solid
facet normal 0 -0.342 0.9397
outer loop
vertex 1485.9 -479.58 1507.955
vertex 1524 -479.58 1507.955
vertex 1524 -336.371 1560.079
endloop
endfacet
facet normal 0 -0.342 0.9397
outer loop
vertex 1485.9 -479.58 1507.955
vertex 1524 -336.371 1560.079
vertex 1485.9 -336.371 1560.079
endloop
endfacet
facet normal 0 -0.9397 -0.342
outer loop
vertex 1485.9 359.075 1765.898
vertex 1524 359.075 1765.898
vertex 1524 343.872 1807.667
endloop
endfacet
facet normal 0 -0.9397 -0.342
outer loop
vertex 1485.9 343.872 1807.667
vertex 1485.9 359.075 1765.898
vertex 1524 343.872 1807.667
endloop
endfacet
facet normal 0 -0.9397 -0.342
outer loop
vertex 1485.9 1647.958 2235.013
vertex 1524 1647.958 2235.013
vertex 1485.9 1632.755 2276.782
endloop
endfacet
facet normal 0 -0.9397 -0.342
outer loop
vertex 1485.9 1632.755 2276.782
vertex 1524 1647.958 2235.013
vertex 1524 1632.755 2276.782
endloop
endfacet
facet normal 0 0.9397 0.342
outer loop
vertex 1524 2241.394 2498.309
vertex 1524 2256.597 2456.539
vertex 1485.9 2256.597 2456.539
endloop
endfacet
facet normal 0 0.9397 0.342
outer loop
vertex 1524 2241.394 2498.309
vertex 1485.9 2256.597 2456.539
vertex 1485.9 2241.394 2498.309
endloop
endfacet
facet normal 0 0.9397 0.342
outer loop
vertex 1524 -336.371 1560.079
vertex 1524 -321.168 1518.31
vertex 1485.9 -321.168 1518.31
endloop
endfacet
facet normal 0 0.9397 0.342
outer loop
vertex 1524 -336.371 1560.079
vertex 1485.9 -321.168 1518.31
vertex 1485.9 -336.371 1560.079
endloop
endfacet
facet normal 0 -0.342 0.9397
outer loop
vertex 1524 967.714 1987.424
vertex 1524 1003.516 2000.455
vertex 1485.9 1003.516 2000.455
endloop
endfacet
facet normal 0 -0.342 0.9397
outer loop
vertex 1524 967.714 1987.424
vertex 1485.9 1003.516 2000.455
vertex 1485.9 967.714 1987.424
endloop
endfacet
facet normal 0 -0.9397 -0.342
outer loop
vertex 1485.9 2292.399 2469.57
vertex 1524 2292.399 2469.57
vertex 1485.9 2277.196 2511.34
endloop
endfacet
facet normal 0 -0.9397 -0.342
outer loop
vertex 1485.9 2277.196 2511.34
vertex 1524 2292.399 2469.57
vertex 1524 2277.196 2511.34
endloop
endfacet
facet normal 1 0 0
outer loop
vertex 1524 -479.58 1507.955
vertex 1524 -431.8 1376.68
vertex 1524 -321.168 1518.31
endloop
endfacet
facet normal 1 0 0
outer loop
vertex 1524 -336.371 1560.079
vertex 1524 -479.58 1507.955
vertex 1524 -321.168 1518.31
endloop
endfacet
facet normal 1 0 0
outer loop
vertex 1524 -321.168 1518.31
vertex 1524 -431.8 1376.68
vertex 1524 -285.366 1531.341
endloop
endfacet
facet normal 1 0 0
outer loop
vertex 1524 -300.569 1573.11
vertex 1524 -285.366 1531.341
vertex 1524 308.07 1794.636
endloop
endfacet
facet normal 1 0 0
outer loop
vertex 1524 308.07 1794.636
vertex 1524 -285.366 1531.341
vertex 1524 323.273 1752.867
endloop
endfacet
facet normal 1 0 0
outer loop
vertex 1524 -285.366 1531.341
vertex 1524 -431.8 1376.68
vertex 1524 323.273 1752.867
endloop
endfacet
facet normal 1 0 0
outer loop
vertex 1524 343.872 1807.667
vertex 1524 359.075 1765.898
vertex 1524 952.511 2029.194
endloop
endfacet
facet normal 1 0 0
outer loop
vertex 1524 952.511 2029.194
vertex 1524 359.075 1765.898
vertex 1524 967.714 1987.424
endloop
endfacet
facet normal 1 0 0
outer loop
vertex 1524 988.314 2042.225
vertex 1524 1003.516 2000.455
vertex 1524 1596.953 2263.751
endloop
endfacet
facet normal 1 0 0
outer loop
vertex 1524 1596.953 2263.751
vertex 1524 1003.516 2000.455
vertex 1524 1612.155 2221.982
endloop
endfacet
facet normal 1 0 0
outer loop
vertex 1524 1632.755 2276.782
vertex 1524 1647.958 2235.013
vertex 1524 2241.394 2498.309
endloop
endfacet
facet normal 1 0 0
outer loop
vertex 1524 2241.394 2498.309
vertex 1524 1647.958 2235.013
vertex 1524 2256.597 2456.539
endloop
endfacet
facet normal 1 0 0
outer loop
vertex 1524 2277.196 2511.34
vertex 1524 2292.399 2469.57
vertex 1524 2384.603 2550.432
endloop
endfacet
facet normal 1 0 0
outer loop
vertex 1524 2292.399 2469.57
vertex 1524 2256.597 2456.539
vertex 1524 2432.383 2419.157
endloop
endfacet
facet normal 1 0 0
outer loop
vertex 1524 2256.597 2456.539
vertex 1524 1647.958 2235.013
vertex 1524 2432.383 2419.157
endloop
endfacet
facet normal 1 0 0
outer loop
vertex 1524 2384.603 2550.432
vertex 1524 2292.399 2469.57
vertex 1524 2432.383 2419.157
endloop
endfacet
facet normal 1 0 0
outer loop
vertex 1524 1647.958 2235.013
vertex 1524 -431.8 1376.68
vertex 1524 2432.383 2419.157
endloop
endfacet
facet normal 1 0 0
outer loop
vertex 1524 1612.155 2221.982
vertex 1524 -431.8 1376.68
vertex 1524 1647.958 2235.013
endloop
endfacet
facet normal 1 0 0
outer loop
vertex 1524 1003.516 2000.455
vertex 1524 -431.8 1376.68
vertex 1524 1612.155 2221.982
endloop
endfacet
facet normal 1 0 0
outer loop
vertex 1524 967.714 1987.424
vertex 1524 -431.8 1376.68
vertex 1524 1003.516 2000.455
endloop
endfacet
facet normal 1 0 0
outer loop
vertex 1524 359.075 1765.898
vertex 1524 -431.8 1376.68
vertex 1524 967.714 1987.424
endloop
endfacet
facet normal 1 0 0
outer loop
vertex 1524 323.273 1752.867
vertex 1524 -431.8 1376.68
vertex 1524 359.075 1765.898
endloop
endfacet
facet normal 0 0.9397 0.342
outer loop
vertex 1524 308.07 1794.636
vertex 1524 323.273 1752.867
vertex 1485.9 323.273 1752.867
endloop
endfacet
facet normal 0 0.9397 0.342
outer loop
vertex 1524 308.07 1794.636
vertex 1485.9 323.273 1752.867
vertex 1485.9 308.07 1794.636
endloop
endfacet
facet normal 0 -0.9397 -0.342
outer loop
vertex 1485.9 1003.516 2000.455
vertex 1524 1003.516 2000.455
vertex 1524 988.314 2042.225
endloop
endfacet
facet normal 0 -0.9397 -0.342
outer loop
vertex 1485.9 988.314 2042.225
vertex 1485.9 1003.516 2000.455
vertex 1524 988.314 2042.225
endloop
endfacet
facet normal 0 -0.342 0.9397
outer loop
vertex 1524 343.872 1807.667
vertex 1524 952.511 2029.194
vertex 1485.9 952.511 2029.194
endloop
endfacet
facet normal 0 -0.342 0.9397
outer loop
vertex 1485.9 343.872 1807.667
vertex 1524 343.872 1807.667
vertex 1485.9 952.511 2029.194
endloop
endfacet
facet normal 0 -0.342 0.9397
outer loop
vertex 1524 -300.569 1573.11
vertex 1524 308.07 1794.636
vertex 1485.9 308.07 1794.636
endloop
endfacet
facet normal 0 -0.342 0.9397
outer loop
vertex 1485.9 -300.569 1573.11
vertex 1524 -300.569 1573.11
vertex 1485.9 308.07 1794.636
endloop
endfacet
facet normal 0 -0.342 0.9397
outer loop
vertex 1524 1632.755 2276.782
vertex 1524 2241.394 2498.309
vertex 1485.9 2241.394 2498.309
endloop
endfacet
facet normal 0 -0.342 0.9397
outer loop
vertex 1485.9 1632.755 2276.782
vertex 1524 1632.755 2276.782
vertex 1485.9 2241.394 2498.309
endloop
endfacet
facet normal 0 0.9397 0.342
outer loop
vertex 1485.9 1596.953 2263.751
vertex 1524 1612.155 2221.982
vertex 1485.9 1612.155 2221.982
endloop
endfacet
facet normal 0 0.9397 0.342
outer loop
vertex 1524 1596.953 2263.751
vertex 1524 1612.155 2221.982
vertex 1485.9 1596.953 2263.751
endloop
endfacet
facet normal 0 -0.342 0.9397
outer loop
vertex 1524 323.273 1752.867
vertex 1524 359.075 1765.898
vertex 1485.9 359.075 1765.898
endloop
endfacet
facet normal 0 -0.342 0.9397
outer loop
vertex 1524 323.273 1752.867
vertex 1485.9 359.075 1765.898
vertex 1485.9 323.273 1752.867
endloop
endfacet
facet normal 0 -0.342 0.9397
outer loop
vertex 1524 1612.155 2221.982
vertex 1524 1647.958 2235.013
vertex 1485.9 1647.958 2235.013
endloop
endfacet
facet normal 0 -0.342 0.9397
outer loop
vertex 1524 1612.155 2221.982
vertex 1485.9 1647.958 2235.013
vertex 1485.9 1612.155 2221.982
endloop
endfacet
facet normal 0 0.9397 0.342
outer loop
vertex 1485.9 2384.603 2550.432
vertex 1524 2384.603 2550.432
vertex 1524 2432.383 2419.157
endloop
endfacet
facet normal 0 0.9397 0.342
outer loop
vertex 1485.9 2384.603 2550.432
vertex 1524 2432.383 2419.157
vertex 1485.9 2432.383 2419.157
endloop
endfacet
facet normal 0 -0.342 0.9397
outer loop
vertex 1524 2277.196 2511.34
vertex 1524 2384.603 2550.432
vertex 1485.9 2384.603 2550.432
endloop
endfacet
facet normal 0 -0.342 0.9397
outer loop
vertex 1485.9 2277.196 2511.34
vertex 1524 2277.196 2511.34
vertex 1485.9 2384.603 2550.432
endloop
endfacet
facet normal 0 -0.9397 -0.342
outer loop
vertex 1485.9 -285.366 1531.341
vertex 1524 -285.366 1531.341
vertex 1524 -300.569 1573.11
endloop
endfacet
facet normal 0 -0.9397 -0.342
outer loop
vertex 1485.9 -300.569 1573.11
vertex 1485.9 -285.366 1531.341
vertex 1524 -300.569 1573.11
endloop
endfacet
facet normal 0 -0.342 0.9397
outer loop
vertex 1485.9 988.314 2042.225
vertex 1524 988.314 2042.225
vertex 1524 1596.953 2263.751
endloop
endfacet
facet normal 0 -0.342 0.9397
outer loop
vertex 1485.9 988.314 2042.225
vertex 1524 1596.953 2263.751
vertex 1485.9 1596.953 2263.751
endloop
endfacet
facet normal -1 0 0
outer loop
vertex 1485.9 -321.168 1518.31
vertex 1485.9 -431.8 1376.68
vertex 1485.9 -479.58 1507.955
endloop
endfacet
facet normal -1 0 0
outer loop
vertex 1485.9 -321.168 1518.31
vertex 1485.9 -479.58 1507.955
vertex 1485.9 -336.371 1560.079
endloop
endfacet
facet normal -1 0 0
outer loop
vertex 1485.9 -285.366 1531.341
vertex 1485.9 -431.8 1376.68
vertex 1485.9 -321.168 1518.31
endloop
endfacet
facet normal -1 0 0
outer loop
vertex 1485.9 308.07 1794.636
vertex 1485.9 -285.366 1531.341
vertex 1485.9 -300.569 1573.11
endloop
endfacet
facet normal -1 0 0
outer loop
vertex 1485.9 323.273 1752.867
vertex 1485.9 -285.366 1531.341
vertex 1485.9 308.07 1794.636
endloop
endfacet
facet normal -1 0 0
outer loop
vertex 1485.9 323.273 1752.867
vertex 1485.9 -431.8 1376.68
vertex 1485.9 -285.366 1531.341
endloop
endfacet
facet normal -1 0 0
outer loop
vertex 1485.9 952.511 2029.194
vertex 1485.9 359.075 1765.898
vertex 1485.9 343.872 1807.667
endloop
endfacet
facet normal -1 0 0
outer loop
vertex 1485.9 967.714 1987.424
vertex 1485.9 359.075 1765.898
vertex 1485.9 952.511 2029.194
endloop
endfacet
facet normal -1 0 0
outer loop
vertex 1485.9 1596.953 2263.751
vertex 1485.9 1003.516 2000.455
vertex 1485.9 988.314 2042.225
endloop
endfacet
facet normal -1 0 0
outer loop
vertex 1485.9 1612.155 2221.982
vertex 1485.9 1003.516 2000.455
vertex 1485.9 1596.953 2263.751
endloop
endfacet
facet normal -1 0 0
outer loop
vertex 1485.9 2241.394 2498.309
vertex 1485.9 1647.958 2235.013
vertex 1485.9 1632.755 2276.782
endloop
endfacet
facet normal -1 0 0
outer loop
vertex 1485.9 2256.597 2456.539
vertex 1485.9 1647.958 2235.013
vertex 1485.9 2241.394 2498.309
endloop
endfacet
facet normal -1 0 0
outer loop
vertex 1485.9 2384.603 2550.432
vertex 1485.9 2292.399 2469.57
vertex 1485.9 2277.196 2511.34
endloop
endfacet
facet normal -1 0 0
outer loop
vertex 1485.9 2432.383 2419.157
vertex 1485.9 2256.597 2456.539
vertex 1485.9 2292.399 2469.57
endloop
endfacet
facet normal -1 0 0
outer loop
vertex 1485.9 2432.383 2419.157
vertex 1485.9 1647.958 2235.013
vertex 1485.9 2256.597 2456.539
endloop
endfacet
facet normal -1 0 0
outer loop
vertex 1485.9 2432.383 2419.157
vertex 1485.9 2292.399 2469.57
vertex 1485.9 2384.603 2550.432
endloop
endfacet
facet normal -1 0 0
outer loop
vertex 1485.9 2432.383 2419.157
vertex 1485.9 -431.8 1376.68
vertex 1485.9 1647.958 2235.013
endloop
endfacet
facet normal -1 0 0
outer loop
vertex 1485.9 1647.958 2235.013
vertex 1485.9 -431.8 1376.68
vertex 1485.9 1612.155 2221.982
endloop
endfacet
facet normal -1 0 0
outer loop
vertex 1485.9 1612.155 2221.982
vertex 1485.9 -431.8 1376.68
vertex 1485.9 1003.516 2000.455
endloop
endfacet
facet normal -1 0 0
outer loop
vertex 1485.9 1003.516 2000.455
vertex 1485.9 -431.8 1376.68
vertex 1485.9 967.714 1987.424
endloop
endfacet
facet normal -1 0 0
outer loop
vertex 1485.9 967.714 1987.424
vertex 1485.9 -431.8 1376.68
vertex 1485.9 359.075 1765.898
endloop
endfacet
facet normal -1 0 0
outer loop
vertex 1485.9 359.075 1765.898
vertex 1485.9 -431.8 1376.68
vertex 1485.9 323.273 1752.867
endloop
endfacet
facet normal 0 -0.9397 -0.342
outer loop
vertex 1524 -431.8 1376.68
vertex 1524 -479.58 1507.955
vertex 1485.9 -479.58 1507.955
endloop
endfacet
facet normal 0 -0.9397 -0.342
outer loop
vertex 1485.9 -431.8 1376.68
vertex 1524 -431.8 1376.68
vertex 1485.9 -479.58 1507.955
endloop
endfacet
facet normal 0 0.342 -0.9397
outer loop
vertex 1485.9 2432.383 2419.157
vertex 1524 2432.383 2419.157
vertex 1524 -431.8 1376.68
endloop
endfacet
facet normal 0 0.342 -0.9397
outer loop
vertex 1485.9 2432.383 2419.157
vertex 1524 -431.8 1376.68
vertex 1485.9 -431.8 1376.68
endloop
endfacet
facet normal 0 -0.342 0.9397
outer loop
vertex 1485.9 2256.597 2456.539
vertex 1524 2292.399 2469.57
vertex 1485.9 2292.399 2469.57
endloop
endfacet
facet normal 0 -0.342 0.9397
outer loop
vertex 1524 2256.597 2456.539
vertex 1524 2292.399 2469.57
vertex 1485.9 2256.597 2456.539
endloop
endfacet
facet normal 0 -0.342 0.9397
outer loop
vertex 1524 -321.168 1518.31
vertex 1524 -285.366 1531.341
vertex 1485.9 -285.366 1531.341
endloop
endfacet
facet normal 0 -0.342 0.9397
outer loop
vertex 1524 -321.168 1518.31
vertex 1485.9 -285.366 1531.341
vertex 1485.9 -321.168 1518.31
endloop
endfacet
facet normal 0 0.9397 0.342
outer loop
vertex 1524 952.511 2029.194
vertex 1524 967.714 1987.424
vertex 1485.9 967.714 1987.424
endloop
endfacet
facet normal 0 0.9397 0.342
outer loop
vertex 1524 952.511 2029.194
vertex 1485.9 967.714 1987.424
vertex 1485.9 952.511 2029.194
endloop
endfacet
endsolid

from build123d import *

# Parameters (mm, degrees)
BOX012_W               = 38.1
BOX012_H               = 3048
BOX012_DEPTH           = 139.7
BOX012_ROLL_ANGLE      = 20
SKETCH031_W            = 38.1
SKETCH031_H            = 44.45
POCKET022_DEPTH        = 38.1010000019
LINEARPATTERN003_COUNT = 5
LINEARPATTERN003_PITCH = 685.8


with BuildPart() as linearpattern003:
    # Box012 → Box012 (new body)
    with BuildSketch(Plane.XY):
        with Locations((19.05, 1524)):
            Rectangle(BOX012_W, BOX012_H)
    extrude(amount=BOX012_DEPTH)


with BuildPart() as linearpattern003_1:
    # Box012 roll: moved
    add(linearpattern003.part.rotate(Axis((0, 0, 0), (1, 0, 0)), BOX012_ROLL_ANGLE))


with BuildPart() as linearpattern003_2:
    # Box012 placement: moved
    add(linearpattern003_1.part.moved(Location((0, -431.8, 1376.68))))

    # Sketch031 → Pocket022 (cut, through all)
    with BuildSketch(Plane(origin=(0, -431.8, 1376.68), x_dir=(0, -0.9396926208, -0.3420201433), z_dir=(-1, 0, 0))):
        with Locations((-171.45, 117.475)):
            Rectangle(SKETCH031_W, SKETCH031_H)
    pocket022 = extrude(amount=-POCKET022_DEPTH, mode=Mode.SUBTRACT)

    # LinearPattern003: Pocket022 ×5
    with Locations(*[Vector(0, 0.9396926208, 0.3420201433) * (i * LINEARPATTERN003_PITCH) for i in range(1, LINEARPATTERN003_COUNT)]):
        add(pocket022, mode=Mode.SUBTRACT)


with BuildPart() as part_mirroring009:
    # Part__Mirroring009: instance of LinearPattern003
    add(linearpattern003_2.part.mirror(Plane(origin=(762, 0, 0), x_dir=(0, -1, 0), z_dir=(1, 0, 0))))


solid = part_mirroring009.part
